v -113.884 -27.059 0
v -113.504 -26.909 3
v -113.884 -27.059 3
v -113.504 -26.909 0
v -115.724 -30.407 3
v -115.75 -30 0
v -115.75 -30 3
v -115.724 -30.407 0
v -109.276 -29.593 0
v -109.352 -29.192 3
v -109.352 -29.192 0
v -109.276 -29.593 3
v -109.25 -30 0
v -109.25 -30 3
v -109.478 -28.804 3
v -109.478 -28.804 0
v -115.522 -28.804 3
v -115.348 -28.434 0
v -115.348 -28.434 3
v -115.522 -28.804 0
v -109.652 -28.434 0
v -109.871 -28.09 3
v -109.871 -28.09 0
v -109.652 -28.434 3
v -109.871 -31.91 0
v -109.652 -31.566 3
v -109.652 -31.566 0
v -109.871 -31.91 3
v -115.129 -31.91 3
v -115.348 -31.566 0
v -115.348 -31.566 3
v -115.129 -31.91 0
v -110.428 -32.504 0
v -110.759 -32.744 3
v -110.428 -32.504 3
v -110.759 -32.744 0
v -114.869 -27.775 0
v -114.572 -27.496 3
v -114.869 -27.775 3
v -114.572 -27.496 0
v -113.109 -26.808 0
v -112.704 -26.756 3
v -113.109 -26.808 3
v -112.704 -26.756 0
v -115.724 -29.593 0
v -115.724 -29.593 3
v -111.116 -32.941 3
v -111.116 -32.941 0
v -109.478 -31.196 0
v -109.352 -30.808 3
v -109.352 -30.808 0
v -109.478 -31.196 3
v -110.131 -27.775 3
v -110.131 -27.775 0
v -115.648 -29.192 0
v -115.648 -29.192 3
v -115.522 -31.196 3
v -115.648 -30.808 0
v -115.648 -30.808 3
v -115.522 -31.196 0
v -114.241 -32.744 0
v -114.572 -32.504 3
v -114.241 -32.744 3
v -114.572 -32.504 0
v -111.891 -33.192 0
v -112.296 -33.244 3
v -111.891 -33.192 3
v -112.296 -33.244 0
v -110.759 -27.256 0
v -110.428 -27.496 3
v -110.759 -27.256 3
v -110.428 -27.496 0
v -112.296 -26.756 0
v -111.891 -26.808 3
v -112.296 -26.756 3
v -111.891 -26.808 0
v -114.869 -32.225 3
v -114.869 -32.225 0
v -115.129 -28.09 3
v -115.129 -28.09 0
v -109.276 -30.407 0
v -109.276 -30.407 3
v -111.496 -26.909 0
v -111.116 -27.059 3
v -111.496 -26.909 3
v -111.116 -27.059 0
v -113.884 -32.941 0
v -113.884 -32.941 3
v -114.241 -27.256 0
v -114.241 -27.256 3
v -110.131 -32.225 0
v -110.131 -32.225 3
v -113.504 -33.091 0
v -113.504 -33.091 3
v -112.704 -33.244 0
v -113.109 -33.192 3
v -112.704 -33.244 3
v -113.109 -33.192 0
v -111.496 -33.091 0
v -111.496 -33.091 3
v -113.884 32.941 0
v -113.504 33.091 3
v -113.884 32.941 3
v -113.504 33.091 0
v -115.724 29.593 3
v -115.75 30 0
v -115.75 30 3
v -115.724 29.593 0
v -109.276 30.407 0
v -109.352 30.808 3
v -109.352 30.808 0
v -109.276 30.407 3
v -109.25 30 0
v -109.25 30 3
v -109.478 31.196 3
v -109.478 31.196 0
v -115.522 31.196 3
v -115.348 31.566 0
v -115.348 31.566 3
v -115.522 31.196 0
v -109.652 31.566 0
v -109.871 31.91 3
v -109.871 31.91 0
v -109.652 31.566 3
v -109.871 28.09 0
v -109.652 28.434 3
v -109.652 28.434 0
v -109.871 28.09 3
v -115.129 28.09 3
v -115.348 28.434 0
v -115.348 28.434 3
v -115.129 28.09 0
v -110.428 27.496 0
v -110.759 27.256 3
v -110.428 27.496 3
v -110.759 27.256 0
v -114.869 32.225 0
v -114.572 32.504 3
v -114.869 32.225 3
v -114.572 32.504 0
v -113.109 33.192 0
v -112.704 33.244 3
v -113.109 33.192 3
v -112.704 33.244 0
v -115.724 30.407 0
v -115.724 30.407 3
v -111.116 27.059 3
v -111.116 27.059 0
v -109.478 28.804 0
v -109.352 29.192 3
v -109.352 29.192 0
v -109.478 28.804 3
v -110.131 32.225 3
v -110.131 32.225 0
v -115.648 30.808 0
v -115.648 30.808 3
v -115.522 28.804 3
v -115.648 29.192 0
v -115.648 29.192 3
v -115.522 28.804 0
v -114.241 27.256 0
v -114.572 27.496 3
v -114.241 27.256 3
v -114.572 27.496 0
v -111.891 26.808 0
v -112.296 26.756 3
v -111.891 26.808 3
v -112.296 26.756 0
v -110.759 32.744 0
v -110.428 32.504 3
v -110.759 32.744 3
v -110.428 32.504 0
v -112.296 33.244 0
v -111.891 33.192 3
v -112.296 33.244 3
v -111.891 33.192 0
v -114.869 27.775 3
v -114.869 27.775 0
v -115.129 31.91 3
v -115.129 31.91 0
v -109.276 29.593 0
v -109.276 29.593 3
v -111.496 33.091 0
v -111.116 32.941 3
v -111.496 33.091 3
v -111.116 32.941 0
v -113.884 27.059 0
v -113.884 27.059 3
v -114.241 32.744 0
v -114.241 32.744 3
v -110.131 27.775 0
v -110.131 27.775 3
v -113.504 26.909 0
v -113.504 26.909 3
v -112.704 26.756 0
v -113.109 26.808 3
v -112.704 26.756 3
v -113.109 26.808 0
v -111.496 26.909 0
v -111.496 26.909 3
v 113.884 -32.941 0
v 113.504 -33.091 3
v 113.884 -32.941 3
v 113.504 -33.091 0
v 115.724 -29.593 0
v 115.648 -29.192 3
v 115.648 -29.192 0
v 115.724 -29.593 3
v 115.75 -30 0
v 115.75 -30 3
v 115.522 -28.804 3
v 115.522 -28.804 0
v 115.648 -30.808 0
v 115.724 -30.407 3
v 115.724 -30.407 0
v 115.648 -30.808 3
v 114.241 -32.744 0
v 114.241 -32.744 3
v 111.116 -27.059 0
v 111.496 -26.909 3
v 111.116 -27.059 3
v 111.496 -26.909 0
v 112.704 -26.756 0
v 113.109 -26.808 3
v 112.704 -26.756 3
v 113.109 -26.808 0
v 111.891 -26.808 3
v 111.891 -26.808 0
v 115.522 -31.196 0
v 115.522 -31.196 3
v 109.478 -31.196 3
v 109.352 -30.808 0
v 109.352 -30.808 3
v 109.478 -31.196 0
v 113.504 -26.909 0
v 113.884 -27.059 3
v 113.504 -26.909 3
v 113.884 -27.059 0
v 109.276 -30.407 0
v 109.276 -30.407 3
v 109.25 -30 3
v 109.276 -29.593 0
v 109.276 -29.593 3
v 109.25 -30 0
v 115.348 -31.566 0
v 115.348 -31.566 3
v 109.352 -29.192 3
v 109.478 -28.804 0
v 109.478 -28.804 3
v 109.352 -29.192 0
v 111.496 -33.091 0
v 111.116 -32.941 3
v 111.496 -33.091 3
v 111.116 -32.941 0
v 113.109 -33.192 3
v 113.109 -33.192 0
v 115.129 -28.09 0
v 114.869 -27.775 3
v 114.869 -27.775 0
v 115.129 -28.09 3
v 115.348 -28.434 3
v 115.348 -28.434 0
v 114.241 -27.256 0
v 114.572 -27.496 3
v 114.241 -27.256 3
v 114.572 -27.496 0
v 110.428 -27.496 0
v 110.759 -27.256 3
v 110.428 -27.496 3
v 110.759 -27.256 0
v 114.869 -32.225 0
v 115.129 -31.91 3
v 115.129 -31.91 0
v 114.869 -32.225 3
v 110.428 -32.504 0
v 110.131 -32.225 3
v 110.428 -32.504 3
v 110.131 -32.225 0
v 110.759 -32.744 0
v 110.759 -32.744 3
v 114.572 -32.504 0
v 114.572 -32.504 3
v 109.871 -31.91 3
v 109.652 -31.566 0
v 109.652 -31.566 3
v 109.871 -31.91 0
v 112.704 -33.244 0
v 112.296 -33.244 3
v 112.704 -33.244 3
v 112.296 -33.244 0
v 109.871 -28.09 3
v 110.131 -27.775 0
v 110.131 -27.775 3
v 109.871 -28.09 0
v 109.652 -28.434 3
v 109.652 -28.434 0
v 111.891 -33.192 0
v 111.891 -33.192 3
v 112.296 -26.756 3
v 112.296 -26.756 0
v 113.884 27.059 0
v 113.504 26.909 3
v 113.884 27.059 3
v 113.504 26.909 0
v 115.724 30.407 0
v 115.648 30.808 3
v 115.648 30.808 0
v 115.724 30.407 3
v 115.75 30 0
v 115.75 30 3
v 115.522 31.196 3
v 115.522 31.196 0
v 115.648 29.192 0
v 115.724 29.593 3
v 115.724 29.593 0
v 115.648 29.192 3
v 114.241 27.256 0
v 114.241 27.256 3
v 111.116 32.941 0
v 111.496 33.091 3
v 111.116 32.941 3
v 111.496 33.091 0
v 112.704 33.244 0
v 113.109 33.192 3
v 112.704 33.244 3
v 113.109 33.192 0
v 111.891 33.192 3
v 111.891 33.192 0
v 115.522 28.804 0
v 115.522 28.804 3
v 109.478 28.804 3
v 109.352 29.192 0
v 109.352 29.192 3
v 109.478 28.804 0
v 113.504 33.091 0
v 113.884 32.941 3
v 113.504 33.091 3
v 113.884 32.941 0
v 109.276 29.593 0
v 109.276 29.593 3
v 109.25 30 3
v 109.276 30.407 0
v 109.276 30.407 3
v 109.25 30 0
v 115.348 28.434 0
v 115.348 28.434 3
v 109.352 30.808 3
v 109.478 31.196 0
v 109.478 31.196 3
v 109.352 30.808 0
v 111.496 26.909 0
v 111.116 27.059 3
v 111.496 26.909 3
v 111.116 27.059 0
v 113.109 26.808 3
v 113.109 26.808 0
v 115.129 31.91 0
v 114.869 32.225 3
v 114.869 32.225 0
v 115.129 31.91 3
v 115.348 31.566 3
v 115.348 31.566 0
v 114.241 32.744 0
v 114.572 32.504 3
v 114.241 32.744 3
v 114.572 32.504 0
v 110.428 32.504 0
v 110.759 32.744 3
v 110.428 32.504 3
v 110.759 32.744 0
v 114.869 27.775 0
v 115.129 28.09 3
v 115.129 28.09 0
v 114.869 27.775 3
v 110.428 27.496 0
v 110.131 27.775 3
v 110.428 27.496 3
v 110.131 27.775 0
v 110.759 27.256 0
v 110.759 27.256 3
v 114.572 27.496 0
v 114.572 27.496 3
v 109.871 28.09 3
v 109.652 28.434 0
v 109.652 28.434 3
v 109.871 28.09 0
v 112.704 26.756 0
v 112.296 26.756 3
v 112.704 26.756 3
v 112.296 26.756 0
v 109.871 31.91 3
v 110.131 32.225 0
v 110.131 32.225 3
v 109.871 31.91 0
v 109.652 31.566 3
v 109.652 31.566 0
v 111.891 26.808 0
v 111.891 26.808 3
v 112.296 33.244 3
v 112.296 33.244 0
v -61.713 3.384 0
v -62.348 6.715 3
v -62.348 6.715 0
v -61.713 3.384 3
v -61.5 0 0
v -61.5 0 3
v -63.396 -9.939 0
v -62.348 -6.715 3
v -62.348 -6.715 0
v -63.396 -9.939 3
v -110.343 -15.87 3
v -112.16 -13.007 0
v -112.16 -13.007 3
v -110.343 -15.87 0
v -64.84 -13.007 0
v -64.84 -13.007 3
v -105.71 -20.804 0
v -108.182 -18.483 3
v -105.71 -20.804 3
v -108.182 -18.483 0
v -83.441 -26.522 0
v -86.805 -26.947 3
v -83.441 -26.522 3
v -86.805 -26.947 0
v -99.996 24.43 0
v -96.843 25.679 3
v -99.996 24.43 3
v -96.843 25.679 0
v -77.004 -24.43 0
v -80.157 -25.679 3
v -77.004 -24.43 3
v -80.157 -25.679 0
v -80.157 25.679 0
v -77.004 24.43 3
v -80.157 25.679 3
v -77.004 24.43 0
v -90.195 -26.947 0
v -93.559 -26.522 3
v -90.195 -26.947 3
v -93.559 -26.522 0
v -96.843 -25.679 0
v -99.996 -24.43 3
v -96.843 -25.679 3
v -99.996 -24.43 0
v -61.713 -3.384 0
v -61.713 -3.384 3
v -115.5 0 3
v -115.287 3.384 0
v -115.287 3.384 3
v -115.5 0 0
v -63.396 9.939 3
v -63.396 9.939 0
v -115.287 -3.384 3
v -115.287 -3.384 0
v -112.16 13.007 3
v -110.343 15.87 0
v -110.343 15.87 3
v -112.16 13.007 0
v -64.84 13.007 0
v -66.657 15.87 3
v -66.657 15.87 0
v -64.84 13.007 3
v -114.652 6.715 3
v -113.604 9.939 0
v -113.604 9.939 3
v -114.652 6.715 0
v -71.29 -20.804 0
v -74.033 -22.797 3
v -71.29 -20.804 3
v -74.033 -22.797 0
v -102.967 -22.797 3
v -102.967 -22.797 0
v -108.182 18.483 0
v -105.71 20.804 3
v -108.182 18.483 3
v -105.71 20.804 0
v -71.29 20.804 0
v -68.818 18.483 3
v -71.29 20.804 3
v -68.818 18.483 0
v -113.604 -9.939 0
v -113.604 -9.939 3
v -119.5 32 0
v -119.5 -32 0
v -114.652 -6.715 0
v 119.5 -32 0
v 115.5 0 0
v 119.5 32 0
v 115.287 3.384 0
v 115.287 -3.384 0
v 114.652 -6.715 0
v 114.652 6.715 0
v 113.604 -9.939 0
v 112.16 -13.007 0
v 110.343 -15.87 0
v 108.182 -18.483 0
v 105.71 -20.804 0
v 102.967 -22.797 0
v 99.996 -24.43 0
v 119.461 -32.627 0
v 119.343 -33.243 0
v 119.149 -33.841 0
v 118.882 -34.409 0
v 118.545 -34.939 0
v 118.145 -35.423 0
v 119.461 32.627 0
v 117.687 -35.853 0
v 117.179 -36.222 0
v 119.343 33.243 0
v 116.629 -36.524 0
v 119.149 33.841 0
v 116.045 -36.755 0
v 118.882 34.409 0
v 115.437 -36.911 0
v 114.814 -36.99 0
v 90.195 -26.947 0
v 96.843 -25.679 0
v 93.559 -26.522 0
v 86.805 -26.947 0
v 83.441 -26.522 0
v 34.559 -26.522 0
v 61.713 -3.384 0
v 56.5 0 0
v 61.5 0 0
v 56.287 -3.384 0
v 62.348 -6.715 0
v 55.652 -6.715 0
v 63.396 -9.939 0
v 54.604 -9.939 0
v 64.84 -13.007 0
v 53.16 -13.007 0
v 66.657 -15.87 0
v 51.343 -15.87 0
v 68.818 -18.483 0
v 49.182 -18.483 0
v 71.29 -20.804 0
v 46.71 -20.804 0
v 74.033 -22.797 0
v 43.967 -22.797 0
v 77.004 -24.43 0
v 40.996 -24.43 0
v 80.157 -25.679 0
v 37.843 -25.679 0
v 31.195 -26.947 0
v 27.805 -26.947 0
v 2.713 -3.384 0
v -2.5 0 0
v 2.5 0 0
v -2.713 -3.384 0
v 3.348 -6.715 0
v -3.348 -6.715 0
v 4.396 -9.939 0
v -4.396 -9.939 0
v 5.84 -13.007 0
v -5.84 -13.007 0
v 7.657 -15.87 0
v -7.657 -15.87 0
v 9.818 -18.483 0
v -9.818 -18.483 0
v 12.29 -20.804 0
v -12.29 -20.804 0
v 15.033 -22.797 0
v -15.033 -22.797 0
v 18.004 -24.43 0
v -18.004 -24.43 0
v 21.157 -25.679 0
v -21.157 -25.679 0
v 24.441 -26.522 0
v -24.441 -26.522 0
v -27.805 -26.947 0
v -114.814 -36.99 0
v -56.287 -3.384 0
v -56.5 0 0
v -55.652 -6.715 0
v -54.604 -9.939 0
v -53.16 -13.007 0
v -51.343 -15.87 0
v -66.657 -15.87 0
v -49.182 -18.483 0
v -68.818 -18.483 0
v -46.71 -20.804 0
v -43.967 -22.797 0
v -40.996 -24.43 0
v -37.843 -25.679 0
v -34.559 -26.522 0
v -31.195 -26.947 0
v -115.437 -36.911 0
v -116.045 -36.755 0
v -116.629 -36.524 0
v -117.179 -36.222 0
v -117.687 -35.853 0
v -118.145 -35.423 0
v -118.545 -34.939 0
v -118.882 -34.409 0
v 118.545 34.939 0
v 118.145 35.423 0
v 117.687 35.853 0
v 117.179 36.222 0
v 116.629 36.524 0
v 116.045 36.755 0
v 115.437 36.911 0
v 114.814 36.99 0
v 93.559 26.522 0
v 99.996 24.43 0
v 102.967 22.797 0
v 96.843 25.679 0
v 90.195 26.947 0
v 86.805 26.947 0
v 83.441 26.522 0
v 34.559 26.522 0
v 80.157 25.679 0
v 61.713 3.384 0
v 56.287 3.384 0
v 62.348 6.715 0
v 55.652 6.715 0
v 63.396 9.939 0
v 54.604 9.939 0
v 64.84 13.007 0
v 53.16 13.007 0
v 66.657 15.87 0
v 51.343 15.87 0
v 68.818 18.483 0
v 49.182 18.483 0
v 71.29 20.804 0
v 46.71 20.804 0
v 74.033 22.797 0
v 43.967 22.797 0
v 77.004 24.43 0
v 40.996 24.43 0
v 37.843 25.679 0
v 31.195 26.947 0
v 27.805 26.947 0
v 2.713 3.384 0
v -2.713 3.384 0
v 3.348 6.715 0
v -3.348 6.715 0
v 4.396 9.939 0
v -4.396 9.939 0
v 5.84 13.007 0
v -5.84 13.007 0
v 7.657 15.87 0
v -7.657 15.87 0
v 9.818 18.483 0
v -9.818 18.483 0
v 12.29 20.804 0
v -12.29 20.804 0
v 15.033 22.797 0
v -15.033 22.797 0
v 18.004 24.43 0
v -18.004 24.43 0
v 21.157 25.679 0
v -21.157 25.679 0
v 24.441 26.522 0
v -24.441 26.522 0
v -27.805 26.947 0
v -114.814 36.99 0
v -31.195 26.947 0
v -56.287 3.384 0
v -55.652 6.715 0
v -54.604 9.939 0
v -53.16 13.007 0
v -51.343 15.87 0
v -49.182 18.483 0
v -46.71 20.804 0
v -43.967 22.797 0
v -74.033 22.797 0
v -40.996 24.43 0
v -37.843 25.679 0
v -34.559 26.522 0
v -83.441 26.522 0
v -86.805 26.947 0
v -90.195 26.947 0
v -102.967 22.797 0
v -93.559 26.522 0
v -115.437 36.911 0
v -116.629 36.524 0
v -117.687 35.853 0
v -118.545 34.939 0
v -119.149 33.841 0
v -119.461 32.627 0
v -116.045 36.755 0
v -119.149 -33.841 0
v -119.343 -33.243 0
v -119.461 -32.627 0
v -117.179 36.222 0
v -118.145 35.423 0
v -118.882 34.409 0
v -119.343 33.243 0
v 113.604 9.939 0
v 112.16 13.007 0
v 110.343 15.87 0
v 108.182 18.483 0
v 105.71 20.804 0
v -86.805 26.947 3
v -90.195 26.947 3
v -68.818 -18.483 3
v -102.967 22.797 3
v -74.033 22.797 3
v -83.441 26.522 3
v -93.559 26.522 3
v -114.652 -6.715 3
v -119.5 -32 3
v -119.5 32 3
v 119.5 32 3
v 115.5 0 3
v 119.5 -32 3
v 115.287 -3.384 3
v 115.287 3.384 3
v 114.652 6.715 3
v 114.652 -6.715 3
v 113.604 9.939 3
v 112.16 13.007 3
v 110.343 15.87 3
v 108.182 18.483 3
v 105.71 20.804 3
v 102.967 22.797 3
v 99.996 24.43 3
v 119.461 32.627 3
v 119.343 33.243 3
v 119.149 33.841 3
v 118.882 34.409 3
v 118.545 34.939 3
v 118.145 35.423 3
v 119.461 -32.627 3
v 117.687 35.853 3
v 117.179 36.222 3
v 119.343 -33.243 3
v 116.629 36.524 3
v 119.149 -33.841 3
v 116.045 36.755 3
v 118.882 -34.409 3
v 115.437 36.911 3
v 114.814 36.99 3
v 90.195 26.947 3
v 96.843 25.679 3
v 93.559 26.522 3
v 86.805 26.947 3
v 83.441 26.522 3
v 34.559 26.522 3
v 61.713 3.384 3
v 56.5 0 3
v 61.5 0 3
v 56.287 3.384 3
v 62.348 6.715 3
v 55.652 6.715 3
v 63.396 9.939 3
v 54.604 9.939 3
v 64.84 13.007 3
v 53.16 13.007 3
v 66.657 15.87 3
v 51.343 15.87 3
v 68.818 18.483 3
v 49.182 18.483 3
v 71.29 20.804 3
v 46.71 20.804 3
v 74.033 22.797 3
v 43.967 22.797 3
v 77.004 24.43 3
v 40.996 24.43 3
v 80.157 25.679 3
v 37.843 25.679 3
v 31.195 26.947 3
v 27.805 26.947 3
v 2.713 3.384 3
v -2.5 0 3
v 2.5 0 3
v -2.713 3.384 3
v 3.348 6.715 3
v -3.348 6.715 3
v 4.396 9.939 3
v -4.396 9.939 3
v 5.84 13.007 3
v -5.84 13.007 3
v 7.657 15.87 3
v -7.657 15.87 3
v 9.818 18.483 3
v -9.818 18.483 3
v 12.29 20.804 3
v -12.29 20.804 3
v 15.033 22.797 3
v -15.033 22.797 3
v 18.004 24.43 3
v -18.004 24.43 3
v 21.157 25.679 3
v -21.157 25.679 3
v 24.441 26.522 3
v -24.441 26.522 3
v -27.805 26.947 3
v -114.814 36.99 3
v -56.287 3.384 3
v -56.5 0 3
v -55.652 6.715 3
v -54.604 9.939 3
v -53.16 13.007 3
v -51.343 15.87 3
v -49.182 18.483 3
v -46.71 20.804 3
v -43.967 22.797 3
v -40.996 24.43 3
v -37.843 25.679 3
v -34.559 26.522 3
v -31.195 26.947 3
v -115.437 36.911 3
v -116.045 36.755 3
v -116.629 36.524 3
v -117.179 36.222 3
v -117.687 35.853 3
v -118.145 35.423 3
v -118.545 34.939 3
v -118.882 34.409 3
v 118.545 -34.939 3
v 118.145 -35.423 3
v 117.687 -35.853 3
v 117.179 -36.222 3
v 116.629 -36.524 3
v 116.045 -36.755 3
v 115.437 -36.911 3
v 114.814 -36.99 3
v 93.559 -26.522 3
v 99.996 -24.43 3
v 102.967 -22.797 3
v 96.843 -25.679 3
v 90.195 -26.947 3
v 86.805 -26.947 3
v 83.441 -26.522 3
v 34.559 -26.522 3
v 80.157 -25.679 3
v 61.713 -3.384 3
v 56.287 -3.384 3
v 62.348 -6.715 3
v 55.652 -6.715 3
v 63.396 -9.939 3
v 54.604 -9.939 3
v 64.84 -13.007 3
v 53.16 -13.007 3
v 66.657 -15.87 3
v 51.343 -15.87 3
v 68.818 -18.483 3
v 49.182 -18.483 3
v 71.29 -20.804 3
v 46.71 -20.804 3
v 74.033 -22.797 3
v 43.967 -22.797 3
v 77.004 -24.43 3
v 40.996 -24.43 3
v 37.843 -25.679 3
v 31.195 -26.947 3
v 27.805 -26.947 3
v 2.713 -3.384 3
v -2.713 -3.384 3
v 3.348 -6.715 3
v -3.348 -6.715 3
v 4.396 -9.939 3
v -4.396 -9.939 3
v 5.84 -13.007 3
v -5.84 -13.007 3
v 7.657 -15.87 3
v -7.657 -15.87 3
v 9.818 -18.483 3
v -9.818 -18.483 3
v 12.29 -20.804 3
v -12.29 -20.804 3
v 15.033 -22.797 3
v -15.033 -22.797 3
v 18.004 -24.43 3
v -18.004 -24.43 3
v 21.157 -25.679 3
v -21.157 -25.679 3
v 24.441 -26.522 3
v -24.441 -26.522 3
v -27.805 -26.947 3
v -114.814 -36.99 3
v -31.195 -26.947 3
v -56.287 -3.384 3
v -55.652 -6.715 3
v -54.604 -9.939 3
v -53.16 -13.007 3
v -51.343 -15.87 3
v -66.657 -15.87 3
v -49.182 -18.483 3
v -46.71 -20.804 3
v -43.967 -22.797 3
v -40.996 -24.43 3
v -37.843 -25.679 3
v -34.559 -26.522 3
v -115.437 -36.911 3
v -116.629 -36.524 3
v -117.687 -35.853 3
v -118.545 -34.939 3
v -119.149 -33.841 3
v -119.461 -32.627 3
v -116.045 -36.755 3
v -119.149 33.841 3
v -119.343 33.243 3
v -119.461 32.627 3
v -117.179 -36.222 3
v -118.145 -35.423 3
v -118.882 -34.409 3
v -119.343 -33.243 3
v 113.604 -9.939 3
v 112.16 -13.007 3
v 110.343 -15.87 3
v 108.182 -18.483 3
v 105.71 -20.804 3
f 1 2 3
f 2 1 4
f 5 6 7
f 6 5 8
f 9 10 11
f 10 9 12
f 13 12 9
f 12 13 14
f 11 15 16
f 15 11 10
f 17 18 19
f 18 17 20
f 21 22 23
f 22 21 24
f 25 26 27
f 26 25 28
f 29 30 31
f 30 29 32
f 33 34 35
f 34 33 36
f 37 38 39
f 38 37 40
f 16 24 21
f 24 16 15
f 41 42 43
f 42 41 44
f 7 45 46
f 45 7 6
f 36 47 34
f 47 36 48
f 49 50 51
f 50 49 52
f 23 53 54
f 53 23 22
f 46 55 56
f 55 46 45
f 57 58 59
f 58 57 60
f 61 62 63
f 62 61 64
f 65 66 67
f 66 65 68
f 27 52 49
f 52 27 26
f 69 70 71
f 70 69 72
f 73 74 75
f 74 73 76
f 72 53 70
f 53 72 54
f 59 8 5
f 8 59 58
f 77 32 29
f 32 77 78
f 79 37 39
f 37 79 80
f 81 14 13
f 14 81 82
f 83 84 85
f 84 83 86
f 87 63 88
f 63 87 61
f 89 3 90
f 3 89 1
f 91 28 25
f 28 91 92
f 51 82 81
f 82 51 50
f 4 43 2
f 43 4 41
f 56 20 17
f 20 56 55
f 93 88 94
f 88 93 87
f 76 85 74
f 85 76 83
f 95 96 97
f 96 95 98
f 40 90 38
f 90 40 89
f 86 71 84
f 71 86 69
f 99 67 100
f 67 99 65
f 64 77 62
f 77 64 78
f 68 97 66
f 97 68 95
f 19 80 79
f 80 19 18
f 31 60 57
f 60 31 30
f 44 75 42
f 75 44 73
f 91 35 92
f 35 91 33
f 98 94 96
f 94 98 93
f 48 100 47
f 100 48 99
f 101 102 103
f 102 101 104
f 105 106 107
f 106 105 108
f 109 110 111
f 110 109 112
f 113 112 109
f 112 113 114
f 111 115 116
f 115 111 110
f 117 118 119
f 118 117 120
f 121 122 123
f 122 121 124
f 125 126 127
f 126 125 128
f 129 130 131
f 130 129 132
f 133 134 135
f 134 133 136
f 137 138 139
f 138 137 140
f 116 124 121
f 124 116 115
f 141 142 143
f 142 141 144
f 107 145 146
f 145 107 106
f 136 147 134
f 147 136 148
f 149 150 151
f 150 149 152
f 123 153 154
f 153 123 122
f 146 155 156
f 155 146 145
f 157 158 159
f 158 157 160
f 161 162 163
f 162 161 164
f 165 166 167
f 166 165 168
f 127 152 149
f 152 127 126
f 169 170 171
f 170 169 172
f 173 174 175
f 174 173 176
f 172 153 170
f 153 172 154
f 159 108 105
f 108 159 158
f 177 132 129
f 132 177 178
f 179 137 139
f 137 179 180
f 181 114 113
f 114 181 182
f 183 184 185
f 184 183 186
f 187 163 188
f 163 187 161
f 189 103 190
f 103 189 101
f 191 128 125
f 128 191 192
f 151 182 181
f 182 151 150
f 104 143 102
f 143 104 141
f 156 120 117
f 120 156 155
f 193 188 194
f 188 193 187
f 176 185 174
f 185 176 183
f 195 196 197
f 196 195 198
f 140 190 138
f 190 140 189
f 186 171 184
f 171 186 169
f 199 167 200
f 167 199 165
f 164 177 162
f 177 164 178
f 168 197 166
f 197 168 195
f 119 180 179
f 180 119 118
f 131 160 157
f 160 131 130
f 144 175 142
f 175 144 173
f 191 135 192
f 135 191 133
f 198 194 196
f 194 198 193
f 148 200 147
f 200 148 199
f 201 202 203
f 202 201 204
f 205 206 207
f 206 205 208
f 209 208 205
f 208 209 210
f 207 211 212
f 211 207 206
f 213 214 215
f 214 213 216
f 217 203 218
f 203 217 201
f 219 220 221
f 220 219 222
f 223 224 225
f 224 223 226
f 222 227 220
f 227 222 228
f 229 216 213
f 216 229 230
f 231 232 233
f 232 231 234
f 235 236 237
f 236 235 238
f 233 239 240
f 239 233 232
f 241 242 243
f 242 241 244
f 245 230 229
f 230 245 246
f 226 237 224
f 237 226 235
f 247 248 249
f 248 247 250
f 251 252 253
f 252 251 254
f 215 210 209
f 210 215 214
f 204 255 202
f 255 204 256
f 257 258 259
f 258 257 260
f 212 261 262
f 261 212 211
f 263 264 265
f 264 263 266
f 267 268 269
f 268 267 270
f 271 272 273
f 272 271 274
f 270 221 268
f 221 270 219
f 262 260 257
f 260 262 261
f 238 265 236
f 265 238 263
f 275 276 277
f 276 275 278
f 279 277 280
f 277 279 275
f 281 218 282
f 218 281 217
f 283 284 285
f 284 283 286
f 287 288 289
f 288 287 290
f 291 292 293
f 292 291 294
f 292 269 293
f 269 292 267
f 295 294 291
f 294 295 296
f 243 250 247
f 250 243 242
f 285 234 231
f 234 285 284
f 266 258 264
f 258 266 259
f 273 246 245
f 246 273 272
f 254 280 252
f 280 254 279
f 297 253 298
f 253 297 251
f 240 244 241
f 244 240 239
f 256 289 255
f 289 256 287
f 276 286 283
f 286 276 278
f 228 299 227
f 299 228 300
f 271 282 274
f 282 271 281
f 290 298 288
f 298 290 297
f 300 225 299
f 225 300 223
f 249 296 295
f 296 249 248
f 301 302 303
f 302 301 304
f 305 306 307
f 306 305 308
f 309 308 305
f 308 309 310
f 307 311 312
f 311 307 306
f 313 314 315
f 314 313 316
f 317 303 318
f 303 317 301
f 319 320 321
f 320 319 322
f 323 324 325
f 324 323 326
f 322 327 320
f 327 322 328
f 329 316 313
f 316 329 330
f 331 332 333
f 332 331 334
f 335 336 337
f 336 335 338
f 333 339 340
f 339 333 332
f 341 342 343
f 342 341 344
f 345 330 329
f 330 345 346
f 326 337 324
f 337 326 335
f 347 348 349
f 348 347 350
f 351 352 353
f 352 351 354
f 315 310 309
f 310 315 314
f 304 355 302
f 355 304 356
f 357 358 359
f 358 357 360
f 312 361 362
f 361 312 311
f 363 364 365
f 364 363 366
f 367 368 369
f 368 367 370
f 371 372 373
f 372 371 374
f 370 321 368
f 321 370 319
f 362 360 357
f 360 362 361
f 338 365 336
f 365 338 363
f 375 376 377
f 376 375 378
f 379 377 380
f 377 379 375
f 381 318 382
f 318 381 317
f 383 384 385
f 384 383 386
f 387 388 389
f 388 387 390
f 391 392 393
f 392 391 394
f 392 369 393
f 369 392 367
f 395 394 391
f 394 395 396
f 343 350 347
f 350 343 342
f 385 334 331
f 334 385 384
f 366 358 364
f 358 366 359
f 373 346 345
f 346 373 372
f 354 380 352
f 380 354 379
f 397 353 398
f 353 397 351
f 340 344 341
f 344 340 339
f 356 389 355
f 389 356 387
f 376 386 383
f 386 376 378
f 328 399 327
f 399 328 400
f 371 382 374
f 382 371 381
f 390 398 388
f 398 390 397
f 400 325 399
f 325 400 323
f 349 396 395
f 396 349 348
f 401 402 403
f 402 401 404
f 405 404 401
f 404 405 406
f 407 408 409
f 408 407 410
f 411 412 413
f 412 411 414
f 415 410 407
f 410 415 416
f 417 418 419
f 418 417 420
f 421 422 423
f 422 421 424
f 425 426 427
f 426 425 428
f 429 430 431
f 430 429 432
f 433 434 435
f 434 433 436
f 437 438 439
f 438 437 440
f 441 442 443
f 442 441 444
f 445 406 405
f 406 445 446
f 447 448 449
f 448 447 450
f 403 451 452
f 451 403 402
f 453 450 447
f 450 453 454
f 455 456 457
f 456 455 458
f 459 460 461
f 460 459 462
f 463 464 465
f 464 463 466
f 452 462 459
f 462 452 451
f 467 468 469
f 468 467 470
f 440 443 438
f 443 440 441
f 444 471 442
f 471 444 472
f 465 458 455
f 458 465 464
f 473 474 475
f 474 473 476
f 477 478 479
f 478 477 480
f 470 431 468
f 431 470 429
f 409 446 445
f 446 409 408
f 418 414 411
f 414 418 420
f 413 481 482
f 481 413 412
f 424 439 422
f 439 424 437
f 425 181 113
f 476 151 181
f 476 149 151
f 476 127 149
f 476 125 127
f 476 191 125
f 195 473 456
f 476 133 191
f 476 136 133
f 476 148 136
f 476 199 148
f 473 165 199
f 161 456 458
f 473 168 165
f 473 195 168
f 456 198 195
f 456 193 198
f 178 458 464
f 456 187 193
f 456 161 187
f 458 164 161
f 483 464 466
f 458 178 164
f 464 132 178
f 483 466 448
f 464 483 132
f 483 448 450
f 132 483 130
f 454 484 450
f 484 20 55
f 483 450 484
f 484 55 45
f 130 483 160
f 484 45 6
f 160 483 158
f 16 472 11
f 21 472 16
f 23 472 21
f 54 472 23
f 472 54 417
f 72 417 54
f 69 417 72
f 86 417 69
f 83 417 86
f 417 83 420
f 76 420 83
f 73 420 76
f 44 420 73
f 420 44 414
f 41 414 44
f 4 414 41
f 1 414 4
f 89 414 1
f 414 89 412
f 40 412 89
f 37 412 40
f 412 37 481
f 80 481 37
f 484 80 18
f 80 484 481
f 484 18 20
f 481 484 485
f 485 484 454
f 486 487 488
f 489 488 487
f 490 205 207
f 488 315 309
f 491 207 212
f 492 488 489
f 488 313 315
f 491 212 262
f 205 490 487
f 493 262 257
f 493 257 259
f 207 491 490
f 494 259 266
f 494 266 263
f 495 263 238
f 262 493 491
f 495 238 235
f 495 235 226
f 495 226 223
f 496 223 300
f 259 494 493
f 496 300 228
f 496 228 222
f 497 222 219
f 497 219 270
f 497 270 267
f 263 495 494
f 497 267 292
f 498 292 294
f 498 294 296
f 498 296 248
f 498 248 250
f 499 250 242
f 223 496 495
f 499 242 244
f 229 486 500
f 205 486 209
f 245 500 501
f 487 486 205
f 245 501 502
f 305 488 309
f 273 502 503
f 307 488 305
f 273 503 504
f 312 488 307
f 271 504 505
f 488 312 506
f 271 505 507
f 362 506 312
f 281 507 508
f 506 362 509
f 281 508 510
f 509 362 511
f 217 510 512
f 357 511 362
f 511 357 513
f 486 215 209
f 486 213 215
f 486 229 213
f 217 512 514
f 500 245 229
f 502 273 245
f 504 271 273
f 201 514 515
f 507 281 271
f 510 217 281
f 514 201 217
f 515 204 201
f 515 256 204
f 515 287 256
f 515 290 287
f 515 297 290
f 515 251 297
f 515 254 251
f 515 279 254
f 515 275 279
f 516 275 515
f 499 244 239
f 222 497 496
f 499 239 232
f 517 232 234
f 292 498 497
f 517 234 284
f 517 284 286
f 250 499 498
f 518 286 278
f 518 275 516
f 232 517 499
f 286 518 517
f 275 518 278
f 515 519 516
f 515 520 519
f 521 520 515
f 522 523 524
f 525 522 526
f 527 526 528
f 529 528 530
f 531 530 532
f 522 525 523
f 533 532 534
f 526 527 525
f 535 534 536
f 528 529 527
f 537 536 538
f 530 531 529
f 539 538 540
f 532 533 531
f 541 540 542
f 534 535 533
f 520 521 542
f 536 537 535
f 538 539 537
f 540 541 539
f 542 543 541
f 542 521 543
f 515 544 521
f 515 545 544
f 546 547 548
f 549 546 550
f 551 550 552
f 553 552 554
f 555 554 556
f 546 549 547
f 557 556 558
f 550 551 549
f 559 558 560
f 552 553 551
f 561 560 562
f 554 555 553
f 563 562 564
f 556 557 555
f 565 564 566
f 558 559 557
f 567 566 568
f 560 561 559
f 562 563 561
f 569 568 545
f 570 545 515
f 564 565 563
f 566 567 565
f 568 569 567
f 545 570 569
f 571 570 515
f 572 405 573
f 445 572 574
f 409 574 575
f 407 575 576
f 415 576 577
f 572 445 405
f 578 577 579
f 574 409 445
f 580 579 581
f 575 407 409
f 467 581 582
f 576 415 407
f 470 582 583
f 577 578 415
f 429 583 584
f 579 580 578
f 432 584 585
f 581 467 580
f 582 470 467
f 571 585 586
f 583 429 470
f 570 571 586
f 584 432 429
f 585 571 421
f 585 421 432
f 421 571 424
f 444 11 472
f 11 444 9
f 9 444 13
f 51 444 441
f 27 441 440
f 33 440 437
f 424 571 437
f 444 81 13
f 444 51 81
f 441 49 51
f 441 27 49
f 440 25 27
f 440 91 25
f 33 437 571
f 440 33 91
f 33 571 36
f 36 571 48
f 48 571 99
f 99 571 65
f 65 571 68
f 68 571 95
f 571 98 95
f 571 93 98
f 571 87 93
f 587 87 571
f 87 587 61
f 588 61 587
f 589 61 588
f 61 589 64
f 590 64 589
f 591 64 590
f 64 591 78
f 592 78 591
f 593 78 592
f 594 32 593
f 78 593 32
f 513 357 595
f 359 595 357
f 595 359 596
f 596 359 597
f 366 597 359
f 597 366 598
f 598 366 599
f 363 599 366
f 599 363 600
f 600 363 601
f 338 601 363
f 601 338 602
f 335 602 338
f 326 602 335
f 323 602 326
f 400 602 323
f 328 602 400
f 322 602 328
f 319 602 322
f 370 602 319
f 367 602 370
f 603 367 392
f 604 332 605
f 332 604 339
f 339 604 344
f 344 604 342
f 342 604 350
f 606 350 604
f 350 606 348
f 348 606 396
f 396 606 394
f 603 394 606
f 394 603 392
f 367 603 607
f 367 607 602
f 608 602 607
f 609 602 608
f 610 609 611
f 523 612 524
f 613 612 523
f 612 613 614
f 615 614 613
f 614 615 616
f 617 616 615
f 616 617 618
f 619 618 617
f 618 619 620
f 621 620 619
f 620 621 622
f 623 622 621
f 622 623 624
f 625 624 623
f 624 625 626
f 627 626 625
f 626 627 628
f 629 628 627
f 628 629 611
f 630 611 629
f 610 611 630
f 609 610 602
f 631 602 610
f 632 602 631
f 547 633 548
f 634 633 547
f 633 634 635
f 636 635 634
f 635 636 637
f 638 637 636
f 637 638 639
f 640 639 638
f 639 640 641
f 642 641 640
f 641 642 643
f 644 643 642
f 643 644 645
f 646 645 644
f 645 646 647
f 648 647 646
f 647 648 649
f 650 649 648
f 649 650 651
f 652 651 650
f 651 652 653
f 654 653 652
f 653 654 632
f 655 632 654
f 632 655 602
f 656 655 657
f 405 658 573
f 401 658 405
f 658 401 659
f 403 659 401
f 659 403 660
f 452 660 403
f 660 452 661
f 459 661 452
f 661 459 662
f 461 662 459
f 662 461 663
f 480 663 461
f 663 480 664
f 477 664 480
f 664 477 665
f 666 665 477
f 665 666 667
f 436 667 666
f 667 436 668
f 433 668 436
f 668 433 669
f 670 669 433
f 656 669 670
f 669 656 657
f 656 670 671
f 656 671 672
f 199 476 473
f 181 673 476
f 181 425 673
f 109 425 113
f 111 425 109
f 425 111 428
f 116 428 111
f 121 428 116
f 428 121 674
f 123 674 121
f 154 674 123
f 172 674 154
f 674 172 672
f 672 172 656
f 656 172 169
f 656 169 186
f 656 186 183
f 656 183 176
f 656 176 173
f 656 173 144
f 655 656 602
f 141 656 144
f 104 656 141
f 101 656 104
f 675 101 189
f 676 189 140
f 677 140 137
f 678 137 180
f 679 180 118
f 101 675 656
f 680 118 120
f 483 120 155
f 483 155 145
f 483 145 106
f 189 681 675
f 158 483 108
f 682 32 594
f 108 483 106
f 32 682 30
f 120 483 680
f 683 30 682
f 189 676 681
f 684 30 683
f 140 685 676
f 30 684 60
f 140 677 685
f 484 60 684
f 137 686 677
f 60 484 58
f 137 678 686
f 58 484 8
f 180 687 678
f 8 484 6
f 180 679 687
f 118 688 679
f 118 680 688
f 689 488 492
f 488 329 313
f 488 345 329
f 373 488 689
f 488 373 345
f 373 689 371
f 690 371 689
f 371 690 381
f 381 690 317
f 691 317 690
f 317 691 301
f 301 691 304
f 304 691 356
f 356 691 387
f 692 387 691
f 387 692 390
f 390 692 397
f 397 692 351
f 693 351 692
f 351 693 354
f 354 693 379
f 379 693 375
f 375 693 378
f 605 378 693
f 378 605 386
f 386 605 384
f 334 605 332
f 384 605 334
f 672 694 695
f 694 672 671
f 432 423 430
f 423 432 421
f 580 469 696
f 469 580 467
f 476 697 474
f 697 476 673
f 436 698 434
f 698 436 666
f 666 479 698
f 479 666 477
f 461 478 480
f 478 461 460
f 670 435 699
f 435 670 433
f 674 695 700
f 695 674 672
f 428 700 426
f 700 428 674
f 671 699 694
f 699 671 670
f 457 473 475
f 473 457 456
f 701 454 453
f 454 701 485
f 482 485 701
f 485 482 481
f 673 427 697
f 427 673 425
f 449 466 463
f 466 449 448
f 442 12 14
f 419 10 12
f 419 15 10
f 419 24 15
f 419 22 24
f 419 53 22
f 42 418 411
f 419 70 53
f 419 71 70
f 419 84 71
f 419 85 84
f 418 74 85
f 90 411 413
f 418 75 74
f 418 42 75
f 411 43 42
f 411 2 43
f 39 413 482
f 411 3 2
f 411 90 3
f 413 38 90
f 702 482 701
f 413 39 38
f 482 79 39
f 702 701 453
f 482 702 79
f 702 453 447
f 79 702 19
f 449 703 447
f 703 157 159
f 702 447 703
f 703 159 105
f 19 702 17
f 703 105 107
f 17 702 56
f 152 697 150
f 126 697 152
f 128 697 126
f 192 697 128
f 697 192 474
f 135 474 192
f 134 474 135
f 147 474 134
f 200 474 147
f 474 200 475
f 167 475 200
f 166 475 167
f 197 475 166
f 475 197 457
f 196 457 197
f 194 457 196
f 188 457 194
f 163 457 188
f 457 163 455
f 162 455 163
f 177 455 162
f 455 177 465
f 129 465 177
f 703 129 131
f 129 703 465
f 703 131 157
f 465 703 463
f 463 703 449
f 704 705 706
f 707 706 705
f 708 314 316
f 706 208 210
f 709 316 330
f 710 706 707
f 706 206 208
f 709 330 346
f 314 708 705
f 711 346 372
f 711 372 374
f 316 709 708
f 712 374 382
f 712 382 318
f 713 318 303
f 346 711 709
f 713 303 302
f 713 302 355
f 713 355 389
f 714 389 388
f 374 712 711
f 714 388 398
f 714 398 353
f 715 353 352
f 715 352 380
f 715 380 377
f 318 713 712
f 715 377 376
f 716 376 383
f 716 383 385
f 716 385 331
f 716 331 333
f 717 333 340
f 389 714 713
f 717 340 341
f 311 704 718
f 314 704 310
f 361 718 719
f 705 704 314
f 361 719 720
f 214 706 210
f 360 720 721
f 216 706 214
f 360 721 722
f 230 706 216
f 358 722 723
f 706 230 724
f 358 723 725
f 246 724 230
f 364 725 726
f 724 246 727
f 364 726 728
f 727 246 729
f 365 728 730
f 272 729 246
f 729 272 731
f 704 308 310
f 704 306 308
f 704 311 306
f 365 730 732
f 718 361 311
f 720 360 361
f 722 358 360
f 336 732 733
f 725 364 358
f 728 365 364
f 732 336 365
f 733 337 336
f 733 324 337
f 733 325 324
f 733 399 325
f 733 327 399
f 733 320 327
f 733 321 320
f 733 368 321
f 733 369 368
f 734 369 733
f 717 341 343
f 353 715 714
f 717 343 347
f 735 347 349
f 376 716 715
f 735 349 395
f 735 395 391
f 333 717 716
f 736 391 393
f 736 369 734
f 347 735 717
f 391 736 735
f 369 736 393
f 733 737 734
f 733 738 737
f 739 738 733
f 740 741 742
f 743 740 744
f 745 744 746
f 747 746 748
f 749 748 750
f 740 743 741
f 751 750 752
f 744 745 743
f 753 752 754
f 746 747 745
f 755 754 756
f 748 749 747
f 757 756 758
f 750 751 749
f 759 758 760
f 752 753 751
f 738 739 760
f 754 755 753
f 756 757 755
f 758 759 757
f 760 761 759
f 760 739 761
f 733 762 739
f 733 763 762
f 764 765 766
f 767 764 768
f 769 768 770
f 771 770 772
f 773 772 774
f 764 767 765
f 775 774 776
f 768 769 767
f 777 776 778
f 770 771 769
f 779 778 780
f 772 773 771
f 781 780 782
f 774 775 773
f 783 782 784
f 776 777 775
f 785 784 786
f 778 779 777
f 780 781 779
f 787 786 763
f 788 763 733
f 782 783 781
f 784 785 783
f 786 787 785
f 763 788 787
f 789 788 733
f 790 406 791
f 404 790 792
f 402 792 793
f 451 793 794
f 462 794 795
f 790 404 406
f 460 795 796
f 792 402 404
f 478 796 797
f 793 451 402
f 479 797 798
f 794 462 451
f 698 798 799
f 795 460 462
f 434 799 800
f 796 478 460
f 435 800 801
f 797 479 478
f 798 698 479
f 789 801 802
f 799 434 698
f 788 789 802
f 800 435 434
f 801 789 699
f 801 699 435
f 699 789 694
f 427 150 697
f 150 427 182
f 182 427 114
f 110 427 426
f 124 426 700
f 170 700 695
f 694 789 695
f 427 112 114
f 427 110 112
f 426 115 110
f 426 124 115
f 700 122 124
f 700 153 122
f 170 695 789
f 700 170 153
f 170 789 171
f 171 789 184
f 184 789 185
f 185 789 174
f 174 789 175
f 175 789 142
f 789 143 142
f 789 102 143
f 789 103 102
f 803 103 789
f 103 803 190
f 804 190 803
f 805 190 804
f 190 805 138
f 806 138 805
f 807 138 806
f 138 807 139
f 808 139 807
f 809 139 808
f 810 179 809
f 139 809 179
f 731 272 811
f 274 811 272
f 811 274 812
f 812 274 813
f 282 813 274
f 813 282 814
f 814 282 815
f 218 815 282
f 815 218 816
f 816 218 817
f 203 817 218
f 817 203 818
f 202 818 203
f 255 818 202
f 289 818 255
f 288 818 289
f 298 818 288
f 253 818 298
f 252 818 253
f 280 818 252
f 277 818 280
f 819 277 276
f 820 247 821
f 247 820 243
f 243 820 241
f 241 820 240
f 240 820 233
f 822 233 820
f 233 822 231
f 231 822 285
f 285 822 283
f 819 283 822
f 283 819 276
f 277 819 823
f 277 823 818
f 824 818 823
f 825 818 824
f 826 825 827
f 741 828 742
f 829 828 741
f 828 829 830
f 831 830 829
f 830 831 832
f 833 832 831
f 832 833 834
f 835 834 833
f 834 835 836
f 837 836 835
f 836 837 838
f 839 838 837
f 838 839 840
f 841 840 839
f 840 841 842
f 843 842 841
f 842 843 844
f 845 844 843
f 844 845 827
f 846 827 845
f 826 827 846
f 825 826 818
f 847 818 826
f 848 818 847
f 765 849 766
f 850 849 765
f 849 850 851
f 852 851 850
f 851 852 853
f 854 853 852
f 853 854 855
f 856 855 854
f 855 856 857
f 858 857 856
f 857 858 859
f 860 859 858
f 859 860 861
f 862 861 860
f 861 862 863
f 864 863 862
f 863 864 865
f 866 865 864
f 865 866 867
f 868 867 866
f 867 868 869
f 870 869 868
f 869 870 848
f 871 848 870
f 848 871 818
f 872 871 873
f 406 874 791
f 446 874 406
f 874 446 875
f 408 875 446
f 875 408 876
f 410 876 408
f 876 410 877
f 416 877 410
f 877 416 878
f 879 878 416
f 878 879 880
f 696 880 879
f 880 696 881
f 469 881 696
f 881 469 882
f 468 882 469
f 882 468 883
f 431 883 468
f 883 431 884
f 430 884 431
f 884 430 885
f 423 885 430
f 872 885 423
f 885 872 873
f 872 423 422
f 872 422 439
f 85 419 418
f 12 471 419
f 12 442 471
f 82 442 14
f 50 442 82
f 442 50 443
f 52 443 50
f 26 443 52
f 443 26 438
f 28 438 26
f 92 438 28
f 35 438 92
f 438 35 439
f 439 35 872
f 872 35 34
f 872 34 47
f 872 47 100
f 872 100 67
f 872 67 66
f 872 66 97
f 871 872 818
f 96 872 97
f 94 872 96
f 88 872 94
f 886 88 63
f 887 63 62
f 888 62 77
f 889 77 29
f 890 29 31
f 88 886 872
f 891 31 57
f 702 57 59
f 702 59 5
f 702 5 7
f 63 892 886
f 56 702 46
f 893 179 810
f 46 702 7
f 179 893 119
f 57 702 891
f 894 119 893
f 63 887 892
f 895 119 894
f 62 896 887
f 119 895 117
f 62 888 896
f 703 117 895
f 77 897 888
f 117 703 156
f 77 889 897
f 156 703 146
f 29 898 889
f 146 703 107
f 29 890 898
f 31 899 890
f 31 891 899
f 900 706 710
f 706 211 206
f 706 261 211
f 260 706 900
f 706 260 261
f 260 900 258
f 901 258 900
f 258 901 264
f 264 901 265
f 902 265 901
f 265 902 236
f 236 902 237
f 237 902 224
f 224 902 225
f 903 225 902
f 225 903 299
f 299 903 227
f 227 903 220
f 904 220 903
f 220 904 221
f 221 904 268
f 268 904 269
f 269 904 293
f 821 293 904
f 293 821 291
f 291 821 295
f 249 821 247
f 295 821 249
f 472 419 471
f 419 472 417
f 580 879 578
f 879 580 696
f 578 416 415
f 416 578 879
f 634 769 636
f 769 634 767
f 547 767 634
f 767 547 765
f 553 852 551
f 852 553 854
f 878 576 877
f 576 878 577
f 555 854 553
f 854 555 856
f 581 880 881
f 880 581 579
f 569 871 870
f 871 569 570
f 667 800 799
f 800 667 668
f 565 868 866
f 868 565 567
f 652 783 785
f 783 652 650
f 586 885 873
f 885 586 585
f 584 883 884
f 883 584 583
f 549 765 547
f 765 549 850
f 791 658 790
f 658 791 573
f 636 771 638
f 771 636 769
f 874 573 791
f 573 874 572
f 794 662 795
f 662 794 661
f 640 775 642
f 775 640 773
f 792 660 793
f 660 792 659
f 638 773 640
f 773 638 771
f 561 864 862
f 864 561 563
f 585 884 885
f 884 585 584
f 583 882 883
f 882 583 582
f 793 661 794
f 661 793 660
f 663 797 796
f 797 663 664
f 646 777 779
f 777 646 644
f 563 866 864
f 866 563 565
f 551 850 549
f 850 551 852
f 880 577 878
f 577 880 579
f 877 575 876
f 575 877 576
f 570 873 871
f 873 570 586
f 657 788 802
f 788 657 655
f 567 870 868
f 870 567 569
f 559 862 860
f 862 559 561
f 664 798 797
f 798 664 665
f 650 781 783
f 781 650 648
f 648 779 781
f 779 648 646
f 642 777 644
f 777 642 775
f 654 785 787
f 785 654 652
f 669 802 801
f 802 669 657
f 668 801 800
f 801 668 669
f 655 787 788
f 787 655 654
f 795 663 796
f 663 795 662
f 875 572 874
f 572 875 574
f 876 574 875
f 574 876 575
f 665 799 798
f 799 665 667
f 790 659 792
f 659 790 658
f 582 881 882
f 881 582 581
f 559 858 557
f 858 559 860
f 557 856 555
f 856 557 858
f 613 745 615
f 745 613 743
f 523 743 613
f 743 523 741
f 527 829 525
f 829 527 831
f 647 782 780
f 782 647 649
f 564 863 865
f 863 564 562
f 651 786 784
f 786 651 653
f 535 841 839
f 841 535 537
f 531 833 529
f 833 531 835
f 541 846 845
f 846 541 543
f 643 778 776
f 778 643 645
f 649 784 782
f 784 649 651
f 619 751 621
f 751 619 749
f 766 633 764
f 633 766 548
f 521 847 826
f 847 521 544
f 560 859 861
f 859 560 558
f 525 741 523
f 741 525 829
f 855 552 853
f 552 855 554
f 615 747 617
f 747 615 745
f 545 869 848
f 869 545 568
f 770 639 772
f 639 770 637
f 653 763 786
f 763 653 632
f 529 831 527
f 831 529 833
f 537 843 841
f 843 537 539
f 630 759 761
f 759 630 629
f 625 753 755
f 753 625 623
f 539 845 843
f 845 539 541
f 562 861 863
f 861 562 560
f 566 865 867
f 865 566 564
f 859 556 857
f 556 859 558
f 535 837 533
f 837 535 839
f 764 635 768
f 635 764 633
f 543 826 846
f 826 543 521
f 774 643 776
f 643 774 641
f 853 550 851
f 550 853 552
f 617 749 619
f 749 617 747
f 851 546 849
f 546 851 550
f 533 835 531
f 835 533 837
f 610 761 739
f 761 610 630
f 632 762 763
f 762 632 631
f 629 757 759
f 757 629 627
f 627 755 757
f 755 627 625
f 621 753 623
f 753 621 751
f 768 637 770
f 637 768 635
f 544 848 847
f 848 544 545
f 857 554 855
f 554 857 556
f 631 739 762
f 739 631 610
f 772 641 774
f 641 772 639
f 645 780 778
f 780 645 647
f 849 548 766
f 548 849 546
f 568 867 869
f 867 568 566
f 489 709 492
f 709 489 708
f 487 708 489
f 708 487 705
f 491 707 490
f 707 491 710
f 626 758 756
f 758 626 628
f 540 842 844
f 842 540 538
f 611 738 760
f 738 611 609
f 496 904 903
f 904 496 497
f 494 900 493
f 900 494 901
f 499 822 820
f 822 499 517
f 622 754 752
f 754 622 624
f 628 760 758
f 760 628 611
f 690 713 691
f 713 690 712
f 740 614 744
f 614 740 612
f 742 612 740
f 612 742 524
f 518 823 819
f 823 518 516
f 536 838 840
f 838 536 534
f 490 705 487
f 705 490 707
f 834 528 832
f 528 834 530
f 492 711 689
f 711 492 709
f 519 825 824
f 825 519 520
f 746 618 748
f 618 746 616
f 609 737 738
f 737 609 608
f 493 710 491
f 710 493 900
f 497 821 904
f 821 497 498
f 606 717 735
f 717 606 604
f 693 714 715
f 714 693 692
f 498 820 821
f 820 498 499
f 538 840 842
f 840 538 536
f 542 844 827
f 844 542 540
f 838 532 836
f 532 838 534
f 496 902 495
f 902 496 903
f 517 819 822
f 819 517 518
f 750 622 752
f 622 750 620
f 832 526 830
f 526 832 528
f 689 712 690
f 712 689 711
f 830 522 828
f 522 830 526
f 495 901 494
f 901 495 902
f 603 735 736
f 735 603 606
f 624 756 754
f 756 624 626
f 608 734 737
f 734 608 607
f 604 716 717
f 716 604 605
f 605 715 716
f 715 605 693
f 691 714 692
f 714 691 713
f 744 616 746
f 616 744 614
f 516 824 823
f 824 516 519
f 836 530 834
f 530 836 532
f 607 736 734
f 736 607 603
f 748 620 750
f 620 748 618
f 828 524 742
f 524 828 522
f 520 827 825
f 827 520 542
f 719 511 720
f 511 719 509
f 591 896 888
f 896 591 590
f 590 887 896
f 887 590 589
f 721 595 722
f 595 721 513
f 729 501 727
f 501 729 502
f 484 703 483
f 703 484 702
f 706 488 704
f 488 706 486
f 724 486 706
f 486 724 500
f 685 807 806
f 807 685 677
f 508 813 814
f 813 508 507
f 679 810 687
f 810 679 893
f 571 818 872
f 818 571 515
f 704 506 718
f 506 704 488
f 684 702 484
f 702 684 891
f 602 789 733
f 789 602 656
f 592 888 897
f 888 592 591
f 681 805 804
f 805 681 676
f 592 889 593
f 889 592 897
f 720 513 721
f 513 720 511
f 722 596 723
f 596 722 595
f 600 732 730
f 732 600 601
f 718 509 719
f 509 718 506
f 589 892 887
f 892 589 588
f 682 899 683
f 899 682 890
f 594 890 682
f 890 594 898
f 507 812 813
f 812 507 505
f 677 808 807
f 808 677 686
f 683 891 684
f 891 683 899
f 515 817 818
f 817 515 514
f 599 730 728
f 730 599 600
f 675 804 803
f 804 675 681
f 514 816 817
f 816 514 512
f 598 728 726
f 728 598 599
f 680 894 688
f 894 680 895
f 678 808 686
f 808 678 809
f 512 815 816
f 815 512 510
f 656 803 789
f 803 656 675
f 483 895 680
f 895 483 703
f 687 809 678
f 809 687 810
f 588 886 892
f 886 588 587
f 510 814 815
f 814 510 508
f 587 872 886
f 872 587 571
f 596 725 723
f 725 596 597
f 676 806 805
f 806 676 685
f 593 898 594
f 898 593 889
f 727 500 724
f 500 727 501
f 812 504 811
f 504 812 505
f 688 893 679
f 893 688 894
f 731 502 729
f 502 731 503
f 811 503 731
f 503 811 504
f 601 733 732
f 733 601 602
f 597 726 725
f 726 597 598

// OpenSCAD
$fn = 50;


difference() {
	union() {
		hull() {
			translate(v = [-114.5000000000, 32.0000000000, 0]) {
				cylinder(h = 3, r = 5);
			}
			translate(v = [114.5000000000, 32.0000000000, 0]) {
				cylinder(h = 3, r = 5);
			}
			translate(v = [-114.5000000000, -32.0000000000, 0]) {
				cylinder(h = 3, r = 5);
			}
			translate(v = [114.5000000000, -32.0000000000, 0]) {
				cylinder(h = 3, r = 5);
			}
		}
	}
	union() {
		#translate(v = [-112.5000000000, -30.0000000000, -100.0000000000]) {
			cylinder(h = 200, r = 3.2500000000);
		}
		#translate(v = [-112.5000000000, 30.0000000000, -100.0000000000]) {
			cylinder(h = 200, r = 3.2500000000);
		}
		#translate(v = [112.5000000000, -30.0000000000, -100.0000000000]) {
			cylinder(h = 200, r = 3.2500000000);
		}
		#translate(v = [112.5000000000, 30.0000000000, -100.0000000000]) {
			cylinder(h = 200, r = 3.2500000000);
		}
		#translate(v = [-88.5000000000, 0, 0]) {
			cylinder(h = 3, r = 27.0000000000);
		}
		#translate(v = [-29.5000000000, 0, 0]) {
			cylinder(h = 3, r = 27.0000000000);
		}
		#translate(v = [29.5000000000, 0, 0]) {
			cylinder(h = 3, r = 27.0000000000);
		}
		#translate(v = [88.5000000000, 0, 0]) {
			cylinder(h = 3, r = 27.0000000000);
		}
	}
}
